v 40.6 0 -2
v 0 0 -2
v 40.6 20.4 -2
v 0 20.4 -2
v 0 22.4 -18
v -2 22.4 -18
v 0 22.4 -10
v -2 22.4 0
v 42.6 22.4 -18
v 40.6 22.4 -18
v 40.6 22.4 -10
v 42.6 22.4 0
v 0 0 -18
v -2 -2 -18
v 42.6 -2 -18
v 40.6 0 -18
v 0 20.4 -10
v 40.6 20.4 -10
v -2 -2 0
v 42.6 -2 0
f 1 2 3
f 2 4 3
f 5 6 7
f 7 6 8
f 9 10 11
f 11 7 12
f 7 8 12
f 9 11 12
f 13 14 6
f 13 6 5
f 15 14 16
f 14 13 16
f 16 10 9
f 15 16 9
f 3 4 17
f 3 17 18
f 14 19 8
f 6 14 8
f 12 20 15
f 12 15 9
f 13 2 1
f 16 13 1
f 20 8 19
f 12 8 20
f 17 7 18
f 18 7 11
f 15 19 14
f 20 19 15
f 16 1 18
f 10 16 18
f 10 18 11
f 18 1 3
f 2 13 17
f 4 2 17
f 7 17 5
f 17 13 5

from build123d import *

# Parameters (mm, degrees)
SKETCH007_W   = 44.6
SKETCH007_H   = 24.4
SKETCH007_W_2 = 40.6
SKETCH007_H_2 = 20.4
PAD006_DEPTH  = 18
BOX001_W      = 44.6
BOX001_H      = 24.2
BOX001_DEPTH  = 2
BOX002_W      = 40.6
BOX002_H      = 3
BOX002_DEPTH  = 8


with BuildPart() as part:
    # Sketch007 → Pad006 (new body)
    with BuildSketch(Plane.XY):
        with Locations((20.3, 10.2)):
            Rectangle(SKETCH007_W, SKETCH007_H)
        with Locations((20.3, 10.2)):
            Rectangle(SKETCH007_W_2, SKETCH007_H_2, mode=Mode.SUBTRACT)
    extrude(amount=-PAD006_DEPTH)

    # Box001 → Box001 (join)
    with BuildSketch(Plane(origin=(-2, -2, -2), x_dir=(1, 0, 0), z_dir=(0, 0, 1))):
        with Locations((22.3, 12.1)):
            Rectangle(BOX001_W, BOX001_H)
    extrude(amount=BOX001_DEPTH)

    # Box002 → Box002 (cut)
    with BuildSketch(Plane(origin=(0, 20, -18), x_dir=(1, 0, 0), z_dir=(0, 0, 1))):
        with Locations((20.3, 1.5)):
            Rectangle(BOX002_W, BOX002_H)
    extrude(amount=BOX002_DEPTH, mode=Mode.SUBTRACT)


solid = part.part
